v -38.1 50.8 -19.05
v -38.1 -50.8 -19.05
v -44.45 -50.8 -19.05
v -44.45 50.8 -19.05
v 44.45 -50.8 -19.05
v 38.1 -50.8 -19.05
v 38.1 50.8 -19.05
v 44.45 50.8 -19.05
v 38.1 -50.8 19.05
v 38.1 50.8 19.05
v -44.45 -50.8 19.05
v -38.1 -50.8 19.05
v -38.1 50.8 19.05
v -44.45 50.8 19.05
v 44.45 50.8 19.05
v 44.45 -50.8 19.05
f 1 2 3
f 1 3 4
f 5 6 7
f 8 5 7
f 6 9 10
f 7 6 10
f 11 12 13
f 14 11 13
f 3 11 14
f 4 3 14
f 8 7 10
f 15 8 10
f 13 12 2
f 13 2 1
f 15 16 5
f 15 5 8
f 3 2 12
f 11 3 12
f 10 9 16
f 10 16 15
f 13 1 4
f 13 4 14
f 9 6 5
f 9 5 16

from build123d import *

# Parameters (mm, degrees)
F3_W     = 101.6
F3_H     = 38.1
F4_DEPTH = 6.35
F2_W     = 101.6
F2_H     = 38.1
F5_DEPTH = 6.35


with BuildPart() as f4:
    # F3 (on offset) → F4 (new body)
    with BuildSketch(Plane.YZ.offset(38.1)):
        Rectangle(F3_W, F3_H)
    extrude(amount=F4_DEPTH)


with BuildPart() as f5:
    # F2 (on offset) → F5 (new body)
    with BuildSketch(Plane.YZ.offset(-38.1)):
        Rectangle(F2_W, F2_H)
    extrude(amount=-F5_DEPTH)


solid = Compound([f4.part, f5.part])
